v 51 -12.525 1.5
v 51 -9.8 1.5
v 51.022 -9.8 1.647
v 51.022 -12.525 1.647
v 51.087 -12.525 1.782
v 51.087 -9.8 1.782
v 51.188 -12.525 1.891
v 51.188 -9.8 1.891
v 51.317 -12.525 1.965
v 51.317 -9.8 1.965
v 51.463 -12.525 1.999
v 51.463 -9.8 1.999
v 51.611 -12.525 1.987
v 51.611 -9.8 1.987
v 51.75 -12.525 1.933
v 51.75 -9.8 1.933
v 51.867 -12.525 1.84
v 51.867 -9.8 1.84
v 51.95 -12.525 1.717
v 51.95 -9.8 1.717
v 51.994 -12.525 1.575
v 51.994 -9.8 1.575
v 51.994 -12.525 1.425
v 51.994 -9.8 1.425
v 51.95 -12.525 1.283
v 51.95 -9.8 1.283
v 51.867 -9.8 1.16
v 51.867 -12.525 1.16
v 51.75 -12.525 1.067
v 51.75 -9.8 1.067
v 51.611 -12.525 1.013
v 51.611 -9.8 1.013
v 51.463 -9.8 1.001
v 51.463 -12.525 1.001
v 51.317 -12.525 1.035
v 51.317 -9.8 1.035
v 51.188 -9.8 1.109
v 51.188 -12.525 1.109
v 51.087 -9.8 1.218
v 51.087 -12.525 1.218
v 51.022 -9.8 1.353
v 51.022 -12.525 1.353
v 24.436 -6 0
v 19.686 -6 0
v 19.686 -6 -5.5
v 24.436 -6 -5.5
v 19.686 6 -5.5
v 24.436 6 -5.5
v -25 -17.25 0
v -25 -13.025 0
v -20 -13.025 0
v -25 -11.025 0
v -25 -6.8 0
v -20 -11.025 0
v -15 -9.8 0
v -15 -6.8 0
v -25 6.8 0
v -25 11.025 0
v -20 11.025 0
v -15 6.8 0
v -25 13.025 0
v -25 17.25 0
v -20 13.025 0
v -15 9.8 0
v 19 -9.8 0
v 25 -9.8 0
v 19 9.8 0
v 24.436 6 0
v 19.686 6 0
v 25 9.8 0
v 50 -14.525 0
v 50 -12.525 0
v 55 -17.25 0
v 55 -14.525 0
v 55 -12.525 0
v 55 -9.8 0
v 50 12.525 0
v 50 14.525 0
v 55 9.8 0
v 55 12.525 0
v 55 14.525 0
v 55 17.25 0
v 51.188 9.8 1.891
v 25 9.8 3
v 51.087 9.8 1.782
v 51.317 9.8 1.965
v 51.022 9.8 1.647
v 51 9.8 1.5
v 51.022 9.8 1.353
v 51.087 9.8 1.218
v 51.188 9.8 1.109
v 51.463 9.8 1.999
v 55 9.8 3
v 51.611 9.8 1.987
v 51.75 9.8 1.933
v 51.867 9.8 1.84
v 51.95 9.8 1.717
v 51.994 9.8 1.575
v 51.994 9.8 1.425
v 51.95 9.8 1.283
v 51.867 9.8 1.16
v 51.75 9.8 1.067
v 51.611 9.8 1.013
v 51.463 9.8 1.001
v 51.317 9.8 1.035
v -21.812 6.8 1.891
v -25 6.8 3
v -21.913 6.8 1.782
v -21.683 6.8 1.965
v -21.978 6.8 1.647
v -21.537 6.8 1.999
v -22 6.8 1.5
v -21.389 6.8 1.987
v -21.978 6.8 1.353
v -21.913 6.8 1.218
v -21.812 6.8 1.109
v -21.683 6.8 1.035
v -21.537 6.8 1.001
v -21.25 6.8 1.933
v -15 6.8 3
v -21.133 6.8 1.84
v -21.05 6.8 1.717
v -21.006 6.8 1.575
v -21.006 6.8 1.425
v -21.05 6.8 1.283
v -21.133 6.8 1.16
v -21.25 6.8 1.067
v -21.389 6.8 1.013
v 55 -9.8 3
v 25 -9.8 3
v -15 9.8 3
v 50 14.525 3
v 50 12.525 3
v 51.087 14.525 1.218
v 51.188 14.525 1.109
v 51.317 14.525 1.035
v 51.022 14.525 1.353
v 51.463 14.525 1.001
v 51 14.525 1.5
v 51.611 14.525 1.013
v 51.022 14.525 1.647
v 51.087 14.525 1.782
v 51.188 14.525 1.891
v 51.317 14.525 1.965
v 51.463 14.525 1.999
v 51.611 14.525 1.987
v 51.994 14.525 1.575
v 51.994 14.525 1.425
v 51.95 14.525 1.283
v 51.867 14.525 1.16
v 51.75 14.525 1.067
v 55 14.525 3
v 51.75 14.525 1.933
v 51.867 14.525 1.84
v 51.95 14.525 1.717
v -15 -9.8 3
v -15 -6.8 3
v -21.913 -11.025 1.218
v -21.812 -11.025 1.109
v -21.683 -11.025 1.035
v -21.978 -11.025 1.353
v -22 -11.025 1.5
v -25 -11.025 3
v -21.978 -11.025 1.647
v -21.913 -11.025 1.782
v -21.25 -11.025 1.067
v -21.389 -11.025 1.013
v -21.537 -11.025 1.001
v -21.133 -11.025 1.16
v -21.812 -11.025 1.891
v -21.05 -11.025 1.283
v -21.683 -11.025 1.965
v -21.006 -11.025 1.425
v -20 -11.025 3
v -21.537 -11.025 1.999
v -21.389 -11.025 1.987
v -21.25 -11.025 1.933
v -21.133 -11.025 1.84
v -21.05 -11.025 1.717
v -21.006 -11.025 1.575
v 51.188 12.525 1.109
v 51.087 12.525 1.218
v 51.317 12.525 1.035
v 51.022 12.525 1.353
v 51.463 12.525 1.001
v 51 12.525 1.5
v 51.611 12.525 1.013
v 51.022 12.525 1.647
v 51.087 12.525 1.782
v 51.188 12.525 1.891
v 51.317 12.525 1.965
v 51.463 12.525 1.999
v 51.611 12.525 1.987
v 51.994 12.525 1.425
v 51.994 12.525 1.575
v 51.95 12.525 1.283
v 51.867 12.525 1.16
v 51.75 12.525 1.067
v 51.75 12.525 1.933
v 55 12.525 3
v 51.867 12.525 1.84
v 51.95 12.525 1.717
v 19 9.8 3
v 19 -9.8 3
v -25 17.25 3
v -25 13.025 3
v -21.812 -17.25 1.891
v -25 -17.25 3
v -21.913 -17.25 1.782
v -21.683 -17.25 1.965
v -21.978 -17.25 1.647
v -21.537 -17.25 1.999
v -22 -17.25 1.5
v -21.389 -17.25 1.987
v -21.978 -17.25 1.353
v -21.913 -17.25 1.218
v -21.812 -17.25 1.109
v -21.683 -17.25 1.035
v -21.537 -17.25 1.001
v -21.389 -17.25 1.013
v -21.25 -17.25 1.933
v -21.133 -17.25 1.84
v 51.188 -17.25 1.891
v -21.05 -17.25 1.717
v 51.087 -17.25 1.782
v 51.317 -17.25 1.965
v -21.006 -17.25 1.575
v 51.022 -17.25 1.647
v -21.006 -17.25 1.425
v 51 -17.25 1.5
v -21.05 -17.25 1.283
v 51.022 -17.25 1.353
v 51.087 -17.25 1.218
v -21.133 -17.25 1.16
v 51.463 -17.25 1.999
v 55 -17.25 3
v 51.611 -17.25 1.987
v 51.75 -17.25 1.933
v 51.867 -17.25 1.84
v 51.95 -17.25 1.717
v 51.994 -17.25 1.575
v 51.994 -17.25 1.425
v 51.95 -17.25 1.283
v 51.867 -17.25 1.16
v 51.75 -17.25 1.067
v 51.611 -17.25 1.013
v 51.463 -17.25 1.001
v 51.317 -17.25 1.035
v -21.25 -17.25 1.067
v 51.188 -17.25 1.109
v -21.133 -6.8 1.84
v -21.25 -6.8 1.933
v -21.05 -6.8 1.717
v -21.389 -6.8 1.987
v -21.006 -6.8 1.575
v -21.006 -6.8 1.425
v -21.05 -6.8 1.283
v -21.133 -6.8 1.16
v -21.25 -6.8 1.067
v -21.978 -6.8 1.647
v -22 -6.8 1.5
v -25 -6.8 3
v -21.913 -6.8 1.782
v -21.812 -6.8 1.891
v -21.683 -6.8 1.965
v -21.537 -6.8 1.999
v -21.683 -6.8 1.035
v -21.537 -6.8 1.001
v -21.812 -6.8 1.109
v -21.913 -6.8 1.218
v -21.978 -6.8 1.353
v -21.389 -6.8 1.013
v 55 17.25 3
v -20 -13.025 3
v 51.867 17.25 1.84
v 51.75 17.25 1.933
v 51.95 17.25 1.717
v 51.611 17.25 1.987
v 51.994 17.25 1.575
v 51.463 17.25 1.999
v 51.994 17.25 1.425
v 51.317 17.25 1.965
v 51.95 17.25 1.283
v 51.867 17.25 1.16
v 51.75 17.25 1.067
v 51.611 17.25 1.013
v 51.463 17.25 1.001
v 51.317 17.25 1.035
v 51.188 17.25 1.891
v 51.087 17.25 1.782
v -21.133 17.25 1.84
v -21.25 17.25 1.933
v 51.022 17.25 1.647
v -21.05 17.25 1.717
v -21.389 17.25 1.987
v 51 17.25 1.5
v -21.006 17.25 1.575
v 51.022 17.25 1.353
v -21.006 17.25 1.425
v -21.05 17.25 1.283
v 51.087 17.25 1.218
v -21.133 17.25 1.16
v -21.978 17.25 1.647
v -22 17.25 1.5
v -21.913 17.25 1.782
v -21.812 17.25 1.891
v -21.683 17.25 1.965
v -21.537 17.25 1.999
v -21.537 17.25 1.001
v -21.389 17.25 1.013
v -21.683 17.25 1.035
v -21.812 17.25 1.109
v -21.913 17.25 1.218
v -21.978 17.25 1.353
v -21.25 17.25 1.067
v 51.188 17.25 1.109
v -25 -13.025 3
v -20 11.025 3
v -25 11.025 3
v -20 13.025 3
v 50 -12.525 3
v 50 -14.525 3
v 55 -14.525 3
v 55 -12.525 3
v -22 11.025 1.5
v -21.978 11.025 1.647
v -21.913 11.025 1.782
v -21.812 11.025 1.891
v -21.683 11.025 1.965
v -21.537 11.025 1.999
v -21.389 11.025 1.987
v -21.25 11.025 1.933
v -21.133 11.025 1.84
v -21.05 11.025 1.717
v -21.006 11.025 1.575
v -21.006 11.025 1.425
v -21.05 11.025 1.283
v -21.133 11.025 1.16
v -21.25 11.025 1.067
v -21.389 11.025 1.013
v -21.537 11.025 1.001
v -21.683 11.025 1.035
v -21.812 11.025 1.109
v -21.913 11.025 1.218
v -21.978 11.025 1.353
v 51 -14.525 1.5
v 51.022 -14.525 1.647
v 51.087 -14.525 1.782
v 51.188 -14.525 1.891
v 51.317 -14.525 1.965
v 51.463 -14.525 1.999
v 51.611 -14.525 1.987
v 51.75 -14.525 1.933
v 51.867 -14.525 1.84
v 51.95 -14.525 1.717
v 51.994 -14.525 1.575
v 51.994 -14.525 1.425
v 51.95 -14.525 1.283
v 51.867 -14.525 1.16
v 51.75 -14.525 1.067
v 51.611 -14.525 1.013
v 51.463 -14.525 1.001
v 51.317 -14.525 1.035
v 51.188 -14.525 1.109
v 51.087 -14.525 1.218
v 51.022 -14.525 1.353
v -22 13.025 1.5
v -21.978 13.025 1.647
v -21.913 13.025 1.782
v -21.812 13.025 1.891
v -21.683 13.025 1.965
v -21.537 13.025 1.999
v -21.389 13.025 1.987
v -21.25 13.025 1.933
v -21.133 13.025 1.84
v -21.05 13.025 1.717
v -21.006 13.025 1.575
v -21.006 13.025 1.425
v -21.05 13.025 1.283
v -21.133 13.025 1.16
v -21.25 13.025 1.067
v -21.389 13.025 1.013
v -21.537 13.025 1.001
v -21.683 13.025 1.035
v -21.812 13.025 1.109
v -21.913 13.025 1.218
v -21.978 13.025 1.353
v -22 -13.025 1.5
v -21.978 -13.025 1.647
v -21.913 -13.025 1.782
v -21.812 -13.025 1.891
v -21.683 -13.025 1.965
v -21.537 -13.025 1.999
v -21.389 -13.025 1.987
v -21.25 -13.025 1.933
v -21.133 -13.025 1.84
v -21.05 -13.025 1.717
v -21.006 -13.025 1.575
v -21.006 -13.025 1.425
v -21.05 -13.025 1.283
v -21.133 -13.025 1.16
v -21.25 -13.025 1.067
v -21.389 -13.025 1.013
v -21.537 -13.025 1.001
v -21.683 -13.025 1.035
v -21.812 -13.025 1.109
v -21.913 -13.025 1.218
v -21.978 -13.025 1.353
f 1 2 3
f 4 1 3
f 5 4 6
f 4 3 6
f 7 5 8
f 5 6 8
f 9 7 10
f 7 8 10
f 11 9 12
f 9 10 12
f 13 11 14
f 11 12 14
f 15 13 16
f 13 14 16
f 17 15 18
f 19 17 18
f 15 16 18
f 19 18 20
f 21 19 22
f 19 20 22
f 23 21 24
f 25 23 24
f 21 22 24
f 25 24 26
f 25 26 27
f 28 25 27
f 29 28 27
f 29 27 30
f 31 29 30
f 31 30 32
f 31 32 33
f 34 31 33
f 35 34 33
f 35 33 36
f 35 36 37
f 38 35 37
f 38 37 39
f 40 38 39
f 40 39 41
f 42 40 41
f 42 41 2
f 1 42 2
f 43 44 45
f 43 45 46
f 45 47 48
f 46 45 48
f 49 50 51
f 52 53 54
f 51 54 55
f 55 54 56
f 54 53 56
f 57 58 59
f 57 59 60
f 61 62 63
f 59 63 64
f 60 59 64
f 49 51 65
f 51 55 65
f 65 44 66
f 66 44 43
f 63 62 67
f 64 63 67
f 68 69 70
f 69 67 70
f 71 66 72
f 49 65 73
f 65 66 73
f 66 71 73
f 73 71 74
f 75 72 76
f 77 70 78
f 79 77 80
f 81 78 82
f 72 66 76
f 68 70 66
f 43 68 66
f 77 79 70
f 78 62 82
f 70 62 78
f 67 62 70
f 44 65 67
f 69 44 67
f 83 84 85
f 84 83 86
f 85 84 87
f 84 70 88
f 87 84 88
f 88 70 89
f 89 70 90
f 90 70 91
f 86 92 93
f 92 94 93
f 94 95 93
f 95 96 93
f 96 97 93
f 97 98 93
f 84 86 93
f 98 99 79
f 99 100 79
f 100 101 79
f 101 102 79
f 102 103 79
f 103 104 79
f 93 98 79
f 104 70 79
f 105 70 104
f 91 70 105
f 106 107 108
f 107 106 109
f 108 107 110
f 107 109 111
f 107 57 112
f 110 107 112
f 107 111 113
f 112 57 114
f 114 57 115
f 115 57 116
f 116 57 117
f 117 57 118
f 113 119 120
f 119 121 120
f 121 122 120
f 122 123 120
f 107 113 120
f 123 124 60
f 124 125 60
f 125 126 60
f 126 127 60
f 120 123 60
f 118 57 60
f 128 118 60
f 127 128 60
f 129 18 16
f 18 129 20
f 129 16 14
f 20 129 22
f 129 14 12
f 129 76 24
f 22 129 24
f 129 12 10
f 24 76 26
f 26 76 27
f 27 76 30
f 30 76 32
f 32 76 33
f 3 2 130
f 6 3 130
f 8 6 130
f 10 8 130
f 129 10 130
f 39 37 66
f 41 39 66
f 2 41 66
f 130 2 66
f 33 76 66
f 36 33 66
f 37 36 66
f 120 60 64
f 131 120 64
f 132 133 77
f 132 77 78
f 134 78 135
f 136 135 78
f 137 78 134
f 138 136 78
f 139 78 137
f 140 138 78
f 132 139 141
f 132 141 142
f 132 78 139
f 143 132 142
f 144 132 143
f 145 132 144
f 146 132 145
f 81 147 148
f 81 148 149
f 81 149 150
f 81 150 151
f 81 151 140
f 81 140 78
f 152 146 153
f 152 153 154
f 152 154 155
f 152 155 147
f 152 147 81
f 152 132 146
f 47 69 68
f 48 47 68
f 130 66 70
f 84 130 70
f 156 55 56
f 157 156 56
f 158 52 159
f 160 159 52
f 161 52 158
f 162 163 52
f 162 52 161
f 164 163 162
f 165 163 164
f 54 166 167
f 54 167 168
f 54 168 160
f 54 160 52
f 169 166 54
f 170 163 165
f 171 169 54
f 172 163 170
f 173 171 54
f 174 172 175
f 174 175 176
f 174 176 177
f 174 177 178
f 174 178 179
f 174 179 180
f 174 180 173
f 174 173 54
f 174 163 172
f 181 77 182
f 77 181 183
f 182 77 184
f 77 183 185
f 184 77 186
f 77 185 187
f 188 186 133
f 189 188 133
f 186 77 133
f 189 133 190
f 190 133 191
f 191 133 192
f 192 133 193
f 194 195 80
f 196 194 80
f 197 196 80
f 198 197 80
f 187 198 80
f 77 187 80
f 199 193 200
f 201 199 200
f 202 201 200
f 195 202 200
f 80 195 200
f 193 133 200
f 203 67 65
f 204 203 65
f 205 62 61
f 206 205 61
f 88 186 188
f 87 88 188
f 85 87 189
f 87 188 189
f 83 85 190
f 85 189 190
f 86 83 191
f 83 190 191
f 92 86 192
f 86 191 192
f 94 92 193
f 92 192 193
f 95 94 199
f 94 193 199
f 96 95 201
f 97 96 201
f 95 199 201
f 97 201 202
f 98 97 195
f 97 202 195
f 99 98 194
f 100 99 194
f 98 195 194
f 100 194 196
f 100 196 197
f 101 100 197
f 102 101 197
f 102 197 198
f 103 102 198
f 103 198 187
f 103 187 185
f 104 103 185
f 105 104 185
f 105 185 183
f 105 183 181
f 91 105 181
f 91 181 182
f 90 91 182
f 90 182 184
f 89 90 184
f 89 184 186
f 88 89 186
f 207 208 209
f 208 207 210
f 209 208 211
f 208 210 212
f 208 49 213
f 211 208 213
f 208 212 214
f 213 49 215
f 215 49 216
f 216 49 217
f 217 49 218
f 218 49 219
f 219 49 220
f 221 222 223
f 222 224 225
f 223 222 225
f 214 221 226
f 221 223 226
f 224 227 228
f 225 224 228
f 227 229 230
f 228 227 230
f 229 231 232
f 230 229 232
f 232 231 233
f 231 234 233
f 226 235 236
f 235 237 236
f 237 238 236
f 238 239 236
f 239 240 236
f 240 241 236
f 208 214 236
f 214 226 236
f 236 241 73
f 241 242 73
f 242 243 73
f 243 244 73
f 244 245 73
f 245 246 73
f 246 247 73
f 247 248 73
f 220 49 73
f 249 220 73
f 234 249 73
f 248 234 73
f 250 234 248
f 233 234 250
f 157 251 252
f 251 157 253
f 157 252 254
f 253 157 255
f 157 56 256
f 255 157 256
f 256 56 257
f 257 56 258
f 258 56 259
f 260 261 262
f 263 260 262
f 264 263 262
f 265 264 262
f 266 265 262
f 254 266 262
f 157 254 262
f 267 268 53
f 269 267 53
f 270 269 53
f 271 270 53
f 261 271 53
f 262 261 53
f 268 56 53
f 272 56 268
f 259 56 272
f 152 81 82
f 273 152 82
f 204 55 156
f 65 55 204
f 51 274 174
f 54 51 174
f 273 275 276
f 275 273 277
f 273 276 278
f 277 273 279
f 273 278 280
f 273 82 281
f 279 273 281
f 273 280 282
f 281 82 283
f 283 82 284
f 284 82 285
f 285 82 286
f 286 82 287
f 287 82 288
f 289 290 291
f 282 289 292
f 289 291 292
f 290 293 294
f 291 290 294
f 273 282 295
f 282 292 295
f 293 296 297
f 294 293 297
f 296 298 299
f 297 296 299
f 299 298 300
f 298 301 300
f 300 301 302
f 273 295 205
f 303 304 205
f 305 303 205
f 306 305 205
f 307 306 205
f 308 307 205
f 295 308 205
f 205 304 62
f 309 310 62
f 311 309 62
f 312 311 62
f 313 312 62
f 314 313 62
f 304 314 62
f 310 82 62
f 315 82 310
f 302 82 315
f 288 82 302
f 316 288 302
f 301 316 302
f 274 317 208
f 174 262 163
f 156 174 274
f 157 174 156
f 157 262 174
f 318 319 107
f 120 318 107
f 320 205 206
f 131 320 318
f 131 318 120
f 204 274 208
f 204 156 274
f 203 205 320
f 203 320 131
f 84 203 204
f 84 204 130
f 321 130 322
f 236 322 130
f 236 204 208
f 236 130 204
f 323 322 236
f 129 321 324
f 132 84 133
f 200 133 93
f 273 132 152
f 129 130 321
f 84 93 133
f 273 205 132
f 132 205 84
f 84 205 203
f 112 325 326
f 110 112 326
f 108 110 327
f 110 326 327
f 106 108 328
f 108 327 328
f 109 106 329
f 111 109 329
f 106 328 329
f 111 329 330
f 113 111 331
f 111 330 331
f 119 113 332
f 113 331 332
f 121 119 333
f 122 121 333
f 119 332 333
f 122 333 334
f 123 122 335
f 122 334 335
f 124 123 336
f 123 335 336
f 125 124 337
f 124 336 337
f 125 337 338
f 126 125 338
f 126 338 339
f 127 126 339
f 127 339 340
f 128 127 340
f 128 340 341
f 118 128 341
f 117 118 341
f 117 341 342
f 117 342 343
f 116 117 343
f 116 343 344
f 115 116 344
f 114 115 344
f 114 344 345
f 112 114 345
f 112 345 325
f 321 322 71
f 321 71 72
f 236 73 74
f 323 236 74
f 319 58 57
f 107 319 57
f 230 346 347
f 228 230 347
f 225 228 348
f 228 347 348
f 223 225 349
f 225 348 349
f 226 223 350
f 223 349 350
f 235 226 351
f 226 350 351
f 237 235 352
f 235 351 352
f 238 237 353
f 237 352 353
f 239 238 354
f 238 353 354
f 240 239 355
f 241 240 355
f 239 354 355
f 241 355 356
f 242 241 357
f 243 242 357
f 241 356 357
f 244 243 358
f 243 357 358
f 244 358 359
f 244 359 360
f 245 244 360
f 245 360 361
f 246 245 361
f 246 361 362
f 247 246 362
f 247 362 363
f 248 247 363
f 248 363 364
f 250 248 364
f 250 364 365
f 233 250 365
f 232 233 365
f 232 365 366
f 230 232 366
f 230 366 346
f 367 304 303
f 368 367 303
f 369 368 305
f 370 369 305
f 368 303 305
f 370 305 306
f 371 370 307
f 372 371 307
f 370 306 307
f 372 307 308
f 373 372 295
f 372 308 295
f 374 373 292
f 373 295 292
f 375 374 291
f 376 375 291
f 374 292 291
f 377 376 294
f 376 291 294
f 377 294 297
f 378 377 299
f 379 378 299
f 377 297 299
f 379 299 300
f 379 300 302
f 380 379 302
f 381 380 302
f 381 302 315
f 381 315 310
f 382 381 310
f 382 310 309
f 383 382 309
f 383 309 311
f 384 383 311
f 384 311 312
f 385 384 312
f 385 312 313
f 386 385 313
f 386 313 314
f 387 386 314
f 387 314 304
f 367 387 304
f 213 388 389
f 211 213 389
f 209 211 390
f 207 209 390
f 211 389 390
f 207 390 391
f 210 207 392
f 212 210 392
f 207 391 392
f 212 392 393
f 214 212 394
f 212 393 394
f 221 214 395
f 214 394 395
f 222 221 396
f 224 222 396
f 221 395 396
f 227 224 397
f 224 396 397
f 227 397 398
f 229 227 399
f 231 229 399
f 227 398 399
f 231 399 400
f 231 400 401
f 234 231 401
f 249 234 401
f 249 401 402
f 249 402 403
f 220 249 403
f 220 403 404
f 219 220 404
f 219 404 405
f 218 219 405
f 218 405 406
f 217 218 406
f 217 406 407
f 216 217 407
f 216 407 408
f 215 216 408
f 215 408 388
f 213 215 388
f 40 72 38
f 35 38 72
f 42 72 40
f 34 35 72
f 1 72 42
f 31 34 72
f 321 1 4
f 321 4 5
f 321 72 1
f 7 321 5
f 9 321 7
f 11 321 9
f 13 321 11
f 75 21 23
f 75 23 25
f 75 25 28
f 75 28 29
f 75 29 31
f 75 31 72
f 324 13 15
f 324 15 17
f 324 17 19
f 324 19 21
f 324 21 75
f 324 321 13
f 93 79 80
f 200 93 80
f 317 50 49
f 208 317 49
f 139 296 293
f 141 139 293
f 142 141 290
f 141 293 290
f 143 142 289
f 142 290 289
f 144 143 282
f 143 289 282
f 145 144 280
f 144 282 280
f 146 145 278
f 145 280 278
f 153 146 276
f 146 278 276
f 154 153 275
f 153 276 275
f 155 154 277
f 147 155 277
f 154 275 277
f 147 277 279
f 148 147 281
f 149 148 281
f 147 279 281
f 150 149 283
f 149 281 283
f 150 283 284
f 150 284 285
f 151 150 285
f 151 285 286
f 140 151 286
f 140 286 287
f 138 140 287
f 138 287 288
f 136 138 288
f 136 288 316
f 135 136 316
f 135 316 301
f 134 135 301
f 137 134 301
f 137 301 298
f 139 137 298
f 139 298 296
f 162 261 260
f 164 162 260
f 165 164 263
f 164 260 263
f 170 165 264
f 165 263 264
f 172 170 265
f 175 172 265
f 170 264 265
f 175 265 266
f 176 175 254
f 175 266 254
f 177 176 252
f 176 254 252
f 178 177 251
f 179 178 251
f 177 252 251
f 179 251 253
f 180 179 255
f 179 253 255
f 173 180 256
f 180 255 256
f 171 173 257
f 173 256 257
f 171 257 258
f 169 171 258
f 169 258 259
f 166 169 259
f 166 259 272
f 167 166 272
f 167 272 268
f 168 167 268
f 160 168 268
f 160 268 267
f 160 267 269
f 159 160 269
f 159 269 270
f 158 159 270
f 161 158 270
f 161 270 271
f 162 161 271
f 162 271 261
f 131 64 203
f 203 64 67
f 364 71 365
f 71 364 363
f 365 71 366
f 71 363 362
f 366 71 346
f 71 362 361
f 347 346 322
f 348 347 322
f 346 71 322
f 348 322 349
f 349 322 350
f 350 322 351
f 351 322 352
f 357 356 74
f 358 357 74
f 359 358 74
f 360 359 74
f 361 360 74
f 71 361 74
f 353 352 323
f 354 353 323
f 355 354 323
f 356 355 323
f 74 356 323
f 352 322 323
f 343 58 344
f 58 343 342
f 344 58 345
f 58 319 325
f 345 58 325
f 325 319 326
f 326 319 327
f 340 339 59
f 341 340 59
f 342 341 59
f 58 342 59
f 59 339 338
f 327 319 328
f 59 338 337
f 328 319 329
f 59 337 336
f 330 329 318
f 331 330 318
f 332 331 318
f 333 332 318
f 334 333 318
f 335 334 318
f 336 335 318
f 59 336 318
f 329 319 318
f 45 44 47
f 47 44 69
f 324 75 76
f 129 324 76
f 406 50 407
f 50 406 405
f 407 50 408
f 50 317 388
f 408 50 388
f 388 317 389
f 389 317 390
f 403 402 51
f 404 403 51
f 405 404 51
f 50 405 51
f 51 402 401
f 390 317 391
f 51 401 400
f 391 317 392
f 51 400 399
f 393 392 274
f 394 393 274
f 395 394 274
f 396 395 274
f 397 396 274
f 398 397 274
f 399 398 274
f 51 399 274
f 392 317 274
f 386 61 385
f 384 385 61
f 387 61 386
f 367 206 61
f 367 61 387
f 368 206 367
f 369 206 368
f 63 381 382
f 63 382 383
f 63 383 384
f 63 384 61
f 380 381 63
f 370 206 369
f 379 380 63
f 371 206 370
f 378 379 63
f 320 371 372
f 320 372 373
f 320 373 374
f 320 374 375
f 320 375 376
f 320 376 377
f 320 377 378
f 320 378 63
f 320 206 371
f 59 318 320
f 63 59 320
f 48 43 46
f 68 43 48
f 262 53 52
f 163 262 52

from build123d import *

# Parameters (mm, degrees)
F0_W     = 30
F0_H     = 7.45
F0_W_2   = 6
F0_W_3   = 4.75
F0_H_2   = 12
F0_W_4   = 0.6859594434
F0_W_5   = 0.5640405566
F0_W_6   = 34
F1_DEPTH = 3
F2_DEPTH = 5.5
F3_W     = 5
F3_H     = 2
F4_DEPTH = 25
F6_D     = 1
F7_W     = 10
F7_H     = 2
F8_DEPTH = 25


with BuildPart() as f1:
    # F0 (on Top) → F1 (new body)
    with BuildSketch(Plane.XY):
        with Locations((40, 13.525)):
            Rectangle(F0_W, F0_H)
        with Locations((40, -13.525)):
            Rectangle(F0_W, F0_H)
        with Locations((22, -13.525)):
            Rectangle(F0_W_2, F0_H)
        Polygon((19.6859594434, -6), (19, -6), (19, -9.8), (25, -9.8), (25, -6), (24.4359594434, -6), align=None)
        with Locations((22.0609594434, 0)):
            Rectangle(F0_W_3, F0_H_2)
        with Locations((19.3429797217, 0)):
            Rectangle(F0_W_4, F0_H_2)
        with Locations((24.7179797217, 0)):
            Rectangle(F0_W_5, F0_H_2)
        Polygon((25, 9.8), (19, 9.8), (19, 6), (19.6859594434, 6), (24.4359594434, 6), (25, 6), align=None)
        with Locations((22, 13.525)):
            Rectangle(F0_W_2, F0_H)
        with Locations((2, 13.525)):
            Rectangle(F0_W_6, F0_H)
        with Locations((2, -13.525)):
            Rectangle(F0_W_6, F0_H)
        Polygon((-15, -6.8), (-25, -6.8), (-25, -17.25), (-15, -17.25), (-15, -9.8), align=None)
        Polygon((-15, 17.25), (-25, 17.25), (-25, 6.8), (-15, 6.8), (-15, 9.8), align=None)
    extrude(amount=F1_DEPTH)

    # F0 (on Top) → F2 (join)
    with BuildSketch(Plane.XY):
        with Locations((22.0609594434, 0)):
            Rectangle(F0_W_3, F0_H_2)
    extrude(amount=-F2_DEPTH)

    # F3 (on face) → F4 (cut)
    with BuildSketch(Plane.XY.offset(3)):
        with Locations((-22.5, 12.025)):
            Rectangle(F3_W, F3_H)
        with Locations((-22.5, -12.025)):
            Rectangle(F3_W, F3_H)
    extrude(amount=-F4_DEPTH, mode=Mode.SUBTRACT)

    # F6 (through all)
    with Locations(Plane.XZ.offset(17.25)):
        with Locations((-21.5, 1.5), (51.5, 1.5)):
            Hole(F6_D / 2)

    # F7 (on face) → F8 (cut)
    with BuildSketch(Plane.XY.offset(3)):
        with Locations((55, -13.525)):
            Rectangle(F7_W, F7_H)
        with Locations((55, 13.525)):
            Rectangle(F7_W, F7_H)
    extrude(amount=-F8_DEPTH, mode=Mode.SUBTRACT)


solid = f1.part
